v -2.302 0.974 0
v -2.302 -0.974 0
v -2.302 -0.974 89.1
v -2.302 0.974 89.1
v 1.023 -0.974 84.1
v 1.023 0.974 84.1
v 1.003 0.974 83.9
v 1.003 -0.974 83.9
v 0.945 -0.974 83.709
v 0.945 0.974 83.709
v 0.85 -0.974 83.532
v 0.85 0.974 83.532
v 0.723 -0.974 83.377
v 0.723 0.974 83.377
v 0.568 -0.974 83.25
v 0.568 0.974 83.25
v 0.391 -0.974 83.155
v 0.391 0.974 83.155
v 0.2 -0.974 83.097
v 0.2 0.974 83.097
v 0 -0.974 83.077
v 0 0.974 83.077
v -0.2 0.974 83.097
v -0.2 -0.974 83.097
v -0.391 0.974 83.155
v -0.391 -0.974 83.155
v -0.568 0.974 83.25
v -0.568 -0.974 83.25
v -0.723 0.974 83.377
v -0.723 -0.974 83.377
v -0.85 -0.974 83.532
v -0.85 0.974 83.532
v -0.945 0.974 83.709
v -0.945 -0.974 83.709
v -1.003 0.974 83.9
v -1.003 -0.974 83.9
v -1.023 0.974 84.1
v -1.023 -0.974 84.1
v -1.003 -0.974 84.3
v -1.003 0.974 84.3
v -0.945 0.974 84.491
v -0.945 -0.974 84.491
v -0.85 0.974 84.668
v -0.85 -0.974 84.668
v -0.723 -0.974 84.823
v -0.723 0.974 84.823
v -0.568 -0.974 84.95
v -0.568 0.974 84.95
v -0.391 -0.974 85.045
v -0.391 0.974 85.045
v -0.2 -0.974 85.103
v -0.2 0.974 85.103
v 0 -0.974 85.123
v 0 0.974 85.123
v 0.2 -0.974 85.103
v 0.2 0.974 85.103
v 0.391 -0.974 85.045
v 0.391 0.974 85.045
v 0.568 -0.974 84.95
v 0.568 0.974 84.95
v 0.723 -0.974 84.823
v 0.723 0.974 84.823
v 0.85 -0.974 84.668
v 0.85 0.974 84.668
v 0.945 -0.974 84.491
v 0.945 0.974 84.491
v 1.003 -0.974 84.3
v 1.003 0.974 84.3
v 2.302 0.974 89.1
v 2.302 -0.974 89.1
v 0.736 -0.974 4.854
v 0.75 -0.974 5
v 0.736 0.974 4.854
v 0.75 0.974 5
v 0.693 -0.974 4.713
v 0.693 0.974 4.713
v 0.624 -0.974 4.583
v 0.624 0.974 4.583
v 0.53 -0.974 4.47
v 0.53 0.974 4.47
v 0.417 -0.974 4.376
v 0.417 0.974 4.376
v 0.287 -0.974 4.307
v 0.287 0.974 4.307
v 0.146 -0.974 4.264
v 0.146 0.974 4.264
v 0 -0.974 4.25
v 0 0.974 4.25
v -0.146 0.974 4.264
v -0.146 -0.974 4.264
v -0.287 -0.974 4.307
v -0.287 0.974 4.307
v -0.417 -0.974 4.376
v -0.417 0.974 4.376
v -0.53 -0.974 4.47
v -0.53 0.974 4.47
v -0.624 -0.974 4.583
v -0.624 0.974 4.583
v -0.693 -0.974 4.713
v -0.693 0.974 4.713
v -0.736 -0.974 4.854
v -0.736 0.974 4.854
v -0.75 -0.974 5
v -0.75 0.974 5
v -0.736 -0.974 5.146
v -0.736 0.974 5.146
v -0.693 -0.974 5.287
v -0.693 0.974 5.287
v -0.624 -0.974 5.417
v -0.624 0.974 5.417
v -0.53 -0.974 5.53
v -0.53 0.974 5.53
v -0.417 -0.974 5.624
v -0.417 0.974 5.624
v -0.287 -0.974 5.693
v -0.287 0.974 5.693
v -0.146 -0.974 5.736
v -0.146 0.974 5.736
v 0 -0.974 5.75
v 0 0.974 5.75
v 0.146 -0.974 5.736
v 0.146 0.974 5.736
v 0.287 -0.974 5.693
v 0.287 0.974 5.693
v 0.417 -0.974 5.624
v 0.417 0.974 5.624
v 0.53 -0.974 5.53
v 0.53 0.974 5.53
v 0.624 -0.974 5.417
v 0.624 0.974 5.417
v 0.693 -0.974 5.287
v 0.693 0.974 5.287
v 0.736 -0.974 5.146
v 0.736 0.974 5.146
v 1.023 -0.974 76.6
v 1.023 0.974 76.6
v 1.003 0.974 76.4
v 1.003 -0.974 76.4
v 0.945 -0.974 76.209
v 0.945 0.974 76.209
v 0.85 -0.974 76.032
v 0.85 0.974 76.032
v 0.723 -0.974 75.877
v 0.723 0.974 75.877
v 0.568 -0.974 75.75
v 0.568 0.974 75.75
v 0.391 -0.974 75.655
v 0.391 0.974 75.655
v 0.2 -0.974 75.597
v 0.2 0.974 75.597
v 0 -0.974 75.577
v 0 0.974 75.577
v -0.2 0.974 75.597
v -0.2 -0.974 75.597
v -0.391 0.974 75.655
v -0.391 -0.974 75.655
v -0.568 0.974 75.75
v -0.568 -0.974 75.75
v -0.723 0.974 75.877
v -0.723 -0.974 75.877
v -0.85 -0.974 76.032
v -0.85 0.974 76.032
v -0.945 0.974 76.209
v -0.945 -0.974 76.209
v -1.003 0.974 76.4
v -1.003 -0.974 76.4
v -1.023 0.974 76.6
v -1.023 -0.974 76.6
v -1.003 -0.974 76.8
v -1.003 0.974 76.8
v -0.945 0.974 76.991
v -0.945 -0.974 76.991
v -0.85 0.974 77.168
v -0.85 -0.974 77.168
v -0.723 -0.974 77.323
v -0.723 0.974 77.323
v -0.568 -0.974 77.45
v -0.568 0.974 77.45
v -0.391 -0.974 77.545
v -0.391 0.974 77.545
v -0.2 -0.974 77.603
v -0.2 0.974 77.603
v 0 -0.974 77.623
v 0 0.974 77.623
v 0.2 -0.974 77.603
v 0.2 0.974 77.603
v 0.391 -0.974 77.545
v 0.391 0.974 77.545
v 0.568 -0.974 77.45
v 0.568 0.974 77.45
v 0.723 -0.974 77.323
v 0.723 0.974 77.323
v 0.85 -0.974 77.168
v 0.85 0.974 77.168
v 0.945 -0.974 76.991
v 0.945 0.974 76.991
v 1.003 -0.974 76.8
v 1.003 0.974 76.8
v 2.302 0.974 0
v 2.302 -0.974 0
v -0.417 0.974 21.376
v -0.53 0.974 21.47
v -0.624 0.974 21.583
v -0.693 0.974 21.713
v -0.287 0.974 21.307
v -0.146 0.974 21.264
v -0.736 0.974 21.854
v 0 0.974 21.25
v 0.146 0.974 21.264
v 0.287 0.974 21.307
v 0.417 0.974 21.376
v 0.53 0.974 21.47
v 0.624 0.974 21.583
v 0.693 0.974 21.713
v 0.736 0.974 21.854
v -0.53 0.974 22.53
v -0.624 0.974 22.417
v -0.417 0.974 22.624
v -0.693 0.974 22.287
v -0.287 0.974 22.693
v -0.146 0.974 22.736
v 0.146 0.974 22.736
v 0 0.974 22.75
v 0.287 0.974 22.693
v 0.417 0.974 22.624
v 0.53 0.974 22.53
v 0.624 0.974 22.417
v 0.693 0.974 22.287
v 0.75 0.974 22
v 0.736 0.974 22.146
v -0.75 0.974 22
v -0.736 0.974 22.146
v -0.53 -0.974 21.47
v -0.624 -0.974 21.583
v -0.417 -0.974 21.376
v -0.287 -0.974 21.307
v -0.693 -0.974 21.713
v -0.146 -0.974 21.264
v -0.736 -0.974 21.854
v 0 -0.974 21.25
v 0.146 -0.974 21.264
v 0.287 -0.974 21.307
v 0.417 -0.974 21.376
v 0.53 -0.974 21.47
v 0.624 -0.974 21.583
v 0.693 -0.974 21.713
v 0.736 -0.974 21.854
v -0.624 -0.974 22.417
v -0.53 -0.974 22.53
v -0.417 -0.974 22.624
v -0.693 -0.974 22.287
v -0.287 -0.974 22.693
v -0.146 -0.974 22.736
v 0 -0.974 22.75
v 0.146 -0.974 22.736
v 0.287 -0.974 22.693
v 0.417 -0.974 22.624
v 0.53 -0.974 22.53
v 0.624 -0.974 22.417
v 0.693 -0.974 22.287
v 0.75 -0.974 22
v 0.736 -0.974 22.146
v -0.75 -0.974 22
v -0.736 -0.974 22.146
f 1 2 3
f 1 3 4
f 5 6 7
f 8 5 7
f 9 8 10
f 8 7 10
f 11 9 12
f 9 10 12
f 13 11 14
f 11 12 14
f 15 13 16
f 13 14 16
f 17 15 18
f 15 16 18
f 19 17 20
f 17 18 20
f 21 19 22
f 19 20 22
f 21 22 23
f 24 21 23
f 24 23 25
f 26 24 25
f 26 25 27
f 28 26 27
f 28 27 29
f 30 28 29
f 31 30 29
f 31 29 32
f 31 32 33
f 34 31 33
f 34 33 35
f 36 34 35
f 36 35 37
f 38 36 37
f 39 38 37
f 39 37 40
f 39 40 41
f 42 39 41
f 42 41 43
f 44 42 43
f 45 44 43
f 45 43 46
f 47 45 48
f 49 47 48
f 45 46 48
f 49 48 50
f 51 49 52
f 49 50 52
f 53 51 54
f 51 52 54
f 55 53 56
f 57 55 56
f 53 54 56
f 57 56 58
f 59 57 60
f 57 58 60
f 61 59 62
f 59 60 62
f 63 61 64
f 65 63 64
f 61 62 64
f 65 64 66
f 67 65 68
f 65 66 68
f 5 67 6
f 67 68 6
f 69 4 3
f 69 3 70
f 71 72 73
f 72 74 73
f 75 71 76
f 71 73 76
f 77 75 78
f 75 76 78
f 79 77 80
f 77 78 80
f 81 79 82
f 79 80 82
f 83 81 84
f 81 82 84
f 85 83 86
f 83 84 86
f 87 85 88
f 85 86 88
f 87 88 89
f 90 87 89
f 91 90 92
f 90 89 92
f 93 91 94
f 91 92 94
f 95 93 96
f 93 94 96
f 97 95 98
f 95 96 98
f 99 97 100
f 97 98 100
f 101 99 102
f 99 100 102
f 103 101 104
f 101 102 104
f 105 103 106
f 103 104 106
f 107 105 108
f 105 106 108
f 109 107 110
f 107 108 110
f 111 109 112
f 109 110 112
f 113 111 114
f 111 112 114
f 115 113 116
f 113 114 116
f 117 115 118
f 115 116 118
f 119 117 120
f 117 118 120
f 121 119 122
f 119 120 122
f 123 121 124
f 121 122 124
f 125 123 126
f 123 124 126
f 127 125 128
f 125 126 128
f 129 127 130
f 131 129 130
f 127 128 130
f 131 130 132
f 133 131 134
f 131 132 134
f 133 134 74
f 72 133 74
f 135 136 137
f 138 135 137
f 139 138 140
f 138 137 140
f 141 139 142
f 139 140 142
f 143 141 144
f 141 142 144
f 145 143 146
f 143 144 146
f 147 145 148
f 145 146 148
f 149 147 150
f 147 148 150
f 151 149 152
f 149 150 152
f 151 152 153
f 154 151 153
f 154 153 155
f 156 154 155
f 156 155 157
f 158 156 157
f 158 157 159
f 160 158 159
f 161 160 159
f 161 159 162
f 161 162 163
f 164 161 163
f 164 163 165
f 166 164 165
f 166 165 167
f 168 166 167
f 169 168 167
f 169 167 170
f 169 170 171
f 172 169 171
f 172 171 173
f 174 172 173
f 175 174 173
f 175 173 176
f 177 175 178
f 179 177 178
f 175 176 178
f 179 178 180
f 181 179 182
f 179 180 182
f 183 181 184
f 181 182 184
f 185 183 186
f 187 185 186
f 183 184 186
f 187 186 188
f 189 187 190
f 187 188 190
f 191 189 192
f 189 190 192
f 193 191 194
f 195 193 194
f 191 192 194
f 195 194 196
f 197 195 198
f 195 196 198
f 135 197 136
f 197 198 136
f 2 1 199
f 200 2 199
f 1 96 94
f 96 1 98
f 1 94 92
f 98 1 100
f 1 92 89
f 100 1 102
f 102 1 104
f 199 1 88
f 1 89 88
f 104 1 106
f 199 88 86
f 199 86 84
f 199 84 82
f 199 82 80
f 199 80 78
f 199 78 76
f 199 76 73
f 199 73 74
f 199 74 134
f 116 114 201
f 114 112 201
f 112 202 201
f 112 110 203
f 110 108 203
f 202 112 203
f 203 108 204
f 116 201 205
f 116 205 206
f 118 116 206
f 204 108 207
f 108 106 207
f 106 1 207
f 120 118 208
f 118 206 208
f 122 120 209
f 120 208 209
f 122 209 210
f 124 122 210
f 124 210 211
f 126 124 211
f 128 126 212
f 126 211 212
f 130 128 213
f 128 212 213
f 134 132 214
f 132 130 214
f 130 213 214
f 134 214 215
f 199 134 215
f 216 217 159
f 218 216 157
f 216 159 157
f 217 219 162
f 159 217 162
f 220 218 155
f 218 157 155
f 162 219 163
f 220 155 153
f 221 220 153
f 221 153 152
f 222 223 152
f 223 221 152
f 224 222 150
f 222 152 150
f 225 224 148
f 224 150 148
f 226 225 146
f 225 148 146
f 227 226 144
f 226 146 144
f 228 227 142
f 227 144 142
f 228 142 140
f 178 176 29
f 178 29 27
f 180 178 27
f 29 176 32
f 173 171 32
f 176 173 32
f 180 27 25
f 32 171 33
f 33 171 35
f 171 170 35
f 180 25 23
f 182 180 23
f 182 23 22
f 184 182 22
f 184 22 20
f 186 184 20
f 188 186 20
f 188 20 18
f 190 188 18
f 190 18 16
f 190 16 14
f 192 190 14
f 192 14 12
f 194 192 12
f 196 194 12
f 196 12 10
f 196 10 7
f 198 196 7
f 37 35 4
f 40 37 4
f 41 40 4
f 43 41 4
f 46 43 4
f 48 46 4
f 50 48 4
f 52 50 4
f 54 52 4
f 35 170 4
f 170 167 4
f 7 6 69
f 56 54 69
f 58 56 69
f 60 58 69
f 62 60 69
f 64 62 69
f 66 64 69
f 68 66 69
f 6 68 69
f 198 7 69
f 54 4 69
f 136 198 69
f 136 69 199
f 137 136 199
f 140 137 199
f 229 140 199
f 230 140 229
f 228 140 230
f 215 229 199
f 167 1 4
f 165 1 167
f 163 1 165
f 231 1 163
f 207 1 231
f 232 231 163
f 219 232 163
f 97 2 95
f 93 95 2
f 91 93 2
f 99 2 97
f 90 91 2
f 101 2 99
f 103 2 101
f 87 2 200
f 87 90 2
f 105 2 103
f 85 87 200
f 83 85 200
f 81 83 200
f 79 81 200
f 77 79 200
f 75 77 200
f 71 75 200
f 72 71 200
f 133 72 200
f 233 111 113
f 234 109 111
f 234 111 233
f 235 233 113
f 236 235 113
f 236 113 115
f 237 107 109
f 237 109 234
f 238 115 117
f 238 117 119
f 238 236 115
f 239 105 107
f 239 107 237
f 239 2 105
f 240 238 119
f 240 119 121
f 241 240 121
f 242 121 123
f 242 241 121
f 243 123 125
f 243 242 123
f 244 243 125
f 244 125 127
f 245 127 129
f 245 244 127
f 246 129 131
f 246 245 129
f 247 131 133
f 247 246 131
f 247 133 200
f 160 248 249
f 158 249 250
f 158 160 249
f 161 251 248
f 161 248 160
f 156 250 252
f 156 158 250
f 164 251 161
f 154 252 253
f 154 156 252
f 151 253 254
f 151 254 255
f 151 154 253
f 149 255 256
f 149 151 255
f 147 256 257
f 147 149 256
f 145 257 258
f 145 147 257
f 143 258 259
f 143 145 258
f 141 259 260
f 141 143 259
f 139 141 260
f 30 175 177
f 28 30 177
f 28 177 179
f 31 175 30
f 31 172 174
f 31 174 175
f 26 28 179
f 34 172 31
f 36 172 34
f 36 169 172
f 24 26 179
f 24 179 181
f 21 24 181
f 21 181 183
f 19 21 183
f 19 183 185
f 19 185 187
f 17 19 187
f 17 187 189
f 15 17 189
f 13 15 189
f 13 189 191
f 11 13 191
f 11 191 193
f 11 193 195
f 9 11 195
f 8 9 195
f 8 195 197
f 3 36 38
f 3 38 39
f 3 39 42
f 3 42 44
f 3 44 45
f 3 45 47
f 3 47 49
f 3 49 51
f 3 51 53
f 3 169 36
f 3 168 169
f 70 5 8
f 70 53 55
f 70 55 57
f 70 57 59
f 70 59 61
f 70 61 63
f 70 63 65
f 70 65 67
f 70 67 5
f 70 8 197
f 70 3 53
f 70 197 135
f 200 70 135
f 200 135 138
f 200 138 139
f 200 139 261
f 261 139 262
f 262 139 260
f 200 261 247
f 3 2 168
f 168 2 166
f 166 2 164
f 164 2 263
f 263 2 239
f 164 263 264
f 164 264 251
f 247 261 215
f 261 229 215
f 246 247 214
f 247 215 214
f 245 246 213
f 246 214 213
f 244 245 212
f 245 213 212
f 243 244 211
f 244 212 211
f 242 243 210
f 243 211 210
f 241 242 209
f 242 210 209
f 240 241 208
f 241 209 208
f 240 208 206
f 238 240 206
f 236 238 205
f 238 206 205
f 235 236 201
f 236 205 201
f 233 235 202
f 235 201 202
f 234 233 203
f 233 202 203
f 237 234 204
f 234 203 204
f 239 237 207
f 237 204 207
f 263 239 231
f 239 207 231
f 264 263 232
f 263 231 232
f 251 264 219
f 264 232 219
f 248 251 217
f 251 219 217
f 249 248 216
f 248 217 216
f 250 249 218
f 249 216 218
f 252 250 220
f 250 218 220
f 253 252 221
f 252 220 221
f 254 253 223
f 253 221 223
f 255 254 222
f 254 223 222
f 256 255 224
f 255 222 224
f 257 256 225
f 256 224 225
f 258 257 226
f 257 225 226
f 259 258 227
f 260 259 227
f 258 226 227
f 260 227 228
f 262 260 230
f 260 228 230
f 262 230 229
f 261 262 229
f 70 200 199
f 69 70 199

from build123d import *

# Parameters (mm, degrees)
SKETCH1_R               = 2.5
BOSS_EXTRUDE1_DEPTH     = 56
SKETCH2_W               = 4.604836256
SKETCH2_H               = 1.948199954
BOSS_EXTRUDE2_DEPTH     = 33.1
SKETCH3_R               = 1.022717979
CUT_EXTRUDE1_DEPTH      = 4.474099977
SKETCH4_R               = 0.75
CUT_EXTRUDE2_DEPTH      = 3.5
CUT_EXTRUDE2_DEPTH_BACK = 3.5
SKETCH5_OUTSIDE_W       = 24.876
SKETCH5_OUTSIDE_H       = 24.876
SKETCH5_OUTSIDE_W_2     = 4.604836256
SKETCH5_OUTSIDE_H_2     = 1.948199954
CUT_EXTRUDE3_DEPTH      = 90.1000001


with BuildPart() as part:
    # Sketch1 → Boss-Extrude1 (new body)
    with BuildSketch(Plane.XY):
        Circle(SKETCH1_R)
    extrude(amount=BOSS_EXTRUDE1_DEPTH)

    # Sketch2 → Boss-Extrude2 (add)
    with BuildSketch(Plane.XY.offset(56)):
        Rectangle(SKETCH2_W, SKETCH2_H)
    extrude(amount=BOSS_EXTRUDE2_DEPTH)

    # Sketch3 → Cut-Extrude1 (cut, through all)
    with BuildSketch(Plane(origin=(0, 0.974099977, 0), x_dir=(1, 0, 0), z_dir=(0, 1, 0))):
        with Locations((0, -76.6)):
            Circle(SKETCH3_R)
        with Locations((0, -84.1)):
            Circle(SKETCH3_R)
    extrude(amount=-CUT_EXTRUDE1_DEPTH, mode=Mode.SUBTRACT)

    # Sketch4 → Cut-Extrude2 (cut, two sides)
    with BuildSketch(Plane(origin=(0, 0, 0), x_dir=(1, 0, 0), z_dir=(0, 1, 0))) as cut_extrude2_sk:
        with Locations((0, -5)):
            Circle(SKETCH4_R)
        with Locations((0, -22)):
            Circle(SKETCH4_R)
    extrude(amount=CUT_EXTRUDE2_DEPTH, mode=Mode.SUBTRACT)
    extrude(cut_extrude2_sk.sketch, amount=-CUT_EXTRUDE2_DEPTH_BACK, mode=Mode.SUBTRACT)

    # Sketch5 outside → Cut-Extrude3 (cut, through all)
    with BuildSketch(Plane.XY.offset(89.1)):
        Rectangle(SKETCH5_OUTSIDE_W, SKETCH5_OUTSIDE_H)
        Rectangle(SKETCH5_OUTSIDE_W_2, SKETCH5_OUTSIDE_H_2, mode=Mode.SUBTRACT)
    extrude(amount=-CUT_EXTRUDE3_DEPTH, mode=Mode.SUBTRACT)


solid = part.part
